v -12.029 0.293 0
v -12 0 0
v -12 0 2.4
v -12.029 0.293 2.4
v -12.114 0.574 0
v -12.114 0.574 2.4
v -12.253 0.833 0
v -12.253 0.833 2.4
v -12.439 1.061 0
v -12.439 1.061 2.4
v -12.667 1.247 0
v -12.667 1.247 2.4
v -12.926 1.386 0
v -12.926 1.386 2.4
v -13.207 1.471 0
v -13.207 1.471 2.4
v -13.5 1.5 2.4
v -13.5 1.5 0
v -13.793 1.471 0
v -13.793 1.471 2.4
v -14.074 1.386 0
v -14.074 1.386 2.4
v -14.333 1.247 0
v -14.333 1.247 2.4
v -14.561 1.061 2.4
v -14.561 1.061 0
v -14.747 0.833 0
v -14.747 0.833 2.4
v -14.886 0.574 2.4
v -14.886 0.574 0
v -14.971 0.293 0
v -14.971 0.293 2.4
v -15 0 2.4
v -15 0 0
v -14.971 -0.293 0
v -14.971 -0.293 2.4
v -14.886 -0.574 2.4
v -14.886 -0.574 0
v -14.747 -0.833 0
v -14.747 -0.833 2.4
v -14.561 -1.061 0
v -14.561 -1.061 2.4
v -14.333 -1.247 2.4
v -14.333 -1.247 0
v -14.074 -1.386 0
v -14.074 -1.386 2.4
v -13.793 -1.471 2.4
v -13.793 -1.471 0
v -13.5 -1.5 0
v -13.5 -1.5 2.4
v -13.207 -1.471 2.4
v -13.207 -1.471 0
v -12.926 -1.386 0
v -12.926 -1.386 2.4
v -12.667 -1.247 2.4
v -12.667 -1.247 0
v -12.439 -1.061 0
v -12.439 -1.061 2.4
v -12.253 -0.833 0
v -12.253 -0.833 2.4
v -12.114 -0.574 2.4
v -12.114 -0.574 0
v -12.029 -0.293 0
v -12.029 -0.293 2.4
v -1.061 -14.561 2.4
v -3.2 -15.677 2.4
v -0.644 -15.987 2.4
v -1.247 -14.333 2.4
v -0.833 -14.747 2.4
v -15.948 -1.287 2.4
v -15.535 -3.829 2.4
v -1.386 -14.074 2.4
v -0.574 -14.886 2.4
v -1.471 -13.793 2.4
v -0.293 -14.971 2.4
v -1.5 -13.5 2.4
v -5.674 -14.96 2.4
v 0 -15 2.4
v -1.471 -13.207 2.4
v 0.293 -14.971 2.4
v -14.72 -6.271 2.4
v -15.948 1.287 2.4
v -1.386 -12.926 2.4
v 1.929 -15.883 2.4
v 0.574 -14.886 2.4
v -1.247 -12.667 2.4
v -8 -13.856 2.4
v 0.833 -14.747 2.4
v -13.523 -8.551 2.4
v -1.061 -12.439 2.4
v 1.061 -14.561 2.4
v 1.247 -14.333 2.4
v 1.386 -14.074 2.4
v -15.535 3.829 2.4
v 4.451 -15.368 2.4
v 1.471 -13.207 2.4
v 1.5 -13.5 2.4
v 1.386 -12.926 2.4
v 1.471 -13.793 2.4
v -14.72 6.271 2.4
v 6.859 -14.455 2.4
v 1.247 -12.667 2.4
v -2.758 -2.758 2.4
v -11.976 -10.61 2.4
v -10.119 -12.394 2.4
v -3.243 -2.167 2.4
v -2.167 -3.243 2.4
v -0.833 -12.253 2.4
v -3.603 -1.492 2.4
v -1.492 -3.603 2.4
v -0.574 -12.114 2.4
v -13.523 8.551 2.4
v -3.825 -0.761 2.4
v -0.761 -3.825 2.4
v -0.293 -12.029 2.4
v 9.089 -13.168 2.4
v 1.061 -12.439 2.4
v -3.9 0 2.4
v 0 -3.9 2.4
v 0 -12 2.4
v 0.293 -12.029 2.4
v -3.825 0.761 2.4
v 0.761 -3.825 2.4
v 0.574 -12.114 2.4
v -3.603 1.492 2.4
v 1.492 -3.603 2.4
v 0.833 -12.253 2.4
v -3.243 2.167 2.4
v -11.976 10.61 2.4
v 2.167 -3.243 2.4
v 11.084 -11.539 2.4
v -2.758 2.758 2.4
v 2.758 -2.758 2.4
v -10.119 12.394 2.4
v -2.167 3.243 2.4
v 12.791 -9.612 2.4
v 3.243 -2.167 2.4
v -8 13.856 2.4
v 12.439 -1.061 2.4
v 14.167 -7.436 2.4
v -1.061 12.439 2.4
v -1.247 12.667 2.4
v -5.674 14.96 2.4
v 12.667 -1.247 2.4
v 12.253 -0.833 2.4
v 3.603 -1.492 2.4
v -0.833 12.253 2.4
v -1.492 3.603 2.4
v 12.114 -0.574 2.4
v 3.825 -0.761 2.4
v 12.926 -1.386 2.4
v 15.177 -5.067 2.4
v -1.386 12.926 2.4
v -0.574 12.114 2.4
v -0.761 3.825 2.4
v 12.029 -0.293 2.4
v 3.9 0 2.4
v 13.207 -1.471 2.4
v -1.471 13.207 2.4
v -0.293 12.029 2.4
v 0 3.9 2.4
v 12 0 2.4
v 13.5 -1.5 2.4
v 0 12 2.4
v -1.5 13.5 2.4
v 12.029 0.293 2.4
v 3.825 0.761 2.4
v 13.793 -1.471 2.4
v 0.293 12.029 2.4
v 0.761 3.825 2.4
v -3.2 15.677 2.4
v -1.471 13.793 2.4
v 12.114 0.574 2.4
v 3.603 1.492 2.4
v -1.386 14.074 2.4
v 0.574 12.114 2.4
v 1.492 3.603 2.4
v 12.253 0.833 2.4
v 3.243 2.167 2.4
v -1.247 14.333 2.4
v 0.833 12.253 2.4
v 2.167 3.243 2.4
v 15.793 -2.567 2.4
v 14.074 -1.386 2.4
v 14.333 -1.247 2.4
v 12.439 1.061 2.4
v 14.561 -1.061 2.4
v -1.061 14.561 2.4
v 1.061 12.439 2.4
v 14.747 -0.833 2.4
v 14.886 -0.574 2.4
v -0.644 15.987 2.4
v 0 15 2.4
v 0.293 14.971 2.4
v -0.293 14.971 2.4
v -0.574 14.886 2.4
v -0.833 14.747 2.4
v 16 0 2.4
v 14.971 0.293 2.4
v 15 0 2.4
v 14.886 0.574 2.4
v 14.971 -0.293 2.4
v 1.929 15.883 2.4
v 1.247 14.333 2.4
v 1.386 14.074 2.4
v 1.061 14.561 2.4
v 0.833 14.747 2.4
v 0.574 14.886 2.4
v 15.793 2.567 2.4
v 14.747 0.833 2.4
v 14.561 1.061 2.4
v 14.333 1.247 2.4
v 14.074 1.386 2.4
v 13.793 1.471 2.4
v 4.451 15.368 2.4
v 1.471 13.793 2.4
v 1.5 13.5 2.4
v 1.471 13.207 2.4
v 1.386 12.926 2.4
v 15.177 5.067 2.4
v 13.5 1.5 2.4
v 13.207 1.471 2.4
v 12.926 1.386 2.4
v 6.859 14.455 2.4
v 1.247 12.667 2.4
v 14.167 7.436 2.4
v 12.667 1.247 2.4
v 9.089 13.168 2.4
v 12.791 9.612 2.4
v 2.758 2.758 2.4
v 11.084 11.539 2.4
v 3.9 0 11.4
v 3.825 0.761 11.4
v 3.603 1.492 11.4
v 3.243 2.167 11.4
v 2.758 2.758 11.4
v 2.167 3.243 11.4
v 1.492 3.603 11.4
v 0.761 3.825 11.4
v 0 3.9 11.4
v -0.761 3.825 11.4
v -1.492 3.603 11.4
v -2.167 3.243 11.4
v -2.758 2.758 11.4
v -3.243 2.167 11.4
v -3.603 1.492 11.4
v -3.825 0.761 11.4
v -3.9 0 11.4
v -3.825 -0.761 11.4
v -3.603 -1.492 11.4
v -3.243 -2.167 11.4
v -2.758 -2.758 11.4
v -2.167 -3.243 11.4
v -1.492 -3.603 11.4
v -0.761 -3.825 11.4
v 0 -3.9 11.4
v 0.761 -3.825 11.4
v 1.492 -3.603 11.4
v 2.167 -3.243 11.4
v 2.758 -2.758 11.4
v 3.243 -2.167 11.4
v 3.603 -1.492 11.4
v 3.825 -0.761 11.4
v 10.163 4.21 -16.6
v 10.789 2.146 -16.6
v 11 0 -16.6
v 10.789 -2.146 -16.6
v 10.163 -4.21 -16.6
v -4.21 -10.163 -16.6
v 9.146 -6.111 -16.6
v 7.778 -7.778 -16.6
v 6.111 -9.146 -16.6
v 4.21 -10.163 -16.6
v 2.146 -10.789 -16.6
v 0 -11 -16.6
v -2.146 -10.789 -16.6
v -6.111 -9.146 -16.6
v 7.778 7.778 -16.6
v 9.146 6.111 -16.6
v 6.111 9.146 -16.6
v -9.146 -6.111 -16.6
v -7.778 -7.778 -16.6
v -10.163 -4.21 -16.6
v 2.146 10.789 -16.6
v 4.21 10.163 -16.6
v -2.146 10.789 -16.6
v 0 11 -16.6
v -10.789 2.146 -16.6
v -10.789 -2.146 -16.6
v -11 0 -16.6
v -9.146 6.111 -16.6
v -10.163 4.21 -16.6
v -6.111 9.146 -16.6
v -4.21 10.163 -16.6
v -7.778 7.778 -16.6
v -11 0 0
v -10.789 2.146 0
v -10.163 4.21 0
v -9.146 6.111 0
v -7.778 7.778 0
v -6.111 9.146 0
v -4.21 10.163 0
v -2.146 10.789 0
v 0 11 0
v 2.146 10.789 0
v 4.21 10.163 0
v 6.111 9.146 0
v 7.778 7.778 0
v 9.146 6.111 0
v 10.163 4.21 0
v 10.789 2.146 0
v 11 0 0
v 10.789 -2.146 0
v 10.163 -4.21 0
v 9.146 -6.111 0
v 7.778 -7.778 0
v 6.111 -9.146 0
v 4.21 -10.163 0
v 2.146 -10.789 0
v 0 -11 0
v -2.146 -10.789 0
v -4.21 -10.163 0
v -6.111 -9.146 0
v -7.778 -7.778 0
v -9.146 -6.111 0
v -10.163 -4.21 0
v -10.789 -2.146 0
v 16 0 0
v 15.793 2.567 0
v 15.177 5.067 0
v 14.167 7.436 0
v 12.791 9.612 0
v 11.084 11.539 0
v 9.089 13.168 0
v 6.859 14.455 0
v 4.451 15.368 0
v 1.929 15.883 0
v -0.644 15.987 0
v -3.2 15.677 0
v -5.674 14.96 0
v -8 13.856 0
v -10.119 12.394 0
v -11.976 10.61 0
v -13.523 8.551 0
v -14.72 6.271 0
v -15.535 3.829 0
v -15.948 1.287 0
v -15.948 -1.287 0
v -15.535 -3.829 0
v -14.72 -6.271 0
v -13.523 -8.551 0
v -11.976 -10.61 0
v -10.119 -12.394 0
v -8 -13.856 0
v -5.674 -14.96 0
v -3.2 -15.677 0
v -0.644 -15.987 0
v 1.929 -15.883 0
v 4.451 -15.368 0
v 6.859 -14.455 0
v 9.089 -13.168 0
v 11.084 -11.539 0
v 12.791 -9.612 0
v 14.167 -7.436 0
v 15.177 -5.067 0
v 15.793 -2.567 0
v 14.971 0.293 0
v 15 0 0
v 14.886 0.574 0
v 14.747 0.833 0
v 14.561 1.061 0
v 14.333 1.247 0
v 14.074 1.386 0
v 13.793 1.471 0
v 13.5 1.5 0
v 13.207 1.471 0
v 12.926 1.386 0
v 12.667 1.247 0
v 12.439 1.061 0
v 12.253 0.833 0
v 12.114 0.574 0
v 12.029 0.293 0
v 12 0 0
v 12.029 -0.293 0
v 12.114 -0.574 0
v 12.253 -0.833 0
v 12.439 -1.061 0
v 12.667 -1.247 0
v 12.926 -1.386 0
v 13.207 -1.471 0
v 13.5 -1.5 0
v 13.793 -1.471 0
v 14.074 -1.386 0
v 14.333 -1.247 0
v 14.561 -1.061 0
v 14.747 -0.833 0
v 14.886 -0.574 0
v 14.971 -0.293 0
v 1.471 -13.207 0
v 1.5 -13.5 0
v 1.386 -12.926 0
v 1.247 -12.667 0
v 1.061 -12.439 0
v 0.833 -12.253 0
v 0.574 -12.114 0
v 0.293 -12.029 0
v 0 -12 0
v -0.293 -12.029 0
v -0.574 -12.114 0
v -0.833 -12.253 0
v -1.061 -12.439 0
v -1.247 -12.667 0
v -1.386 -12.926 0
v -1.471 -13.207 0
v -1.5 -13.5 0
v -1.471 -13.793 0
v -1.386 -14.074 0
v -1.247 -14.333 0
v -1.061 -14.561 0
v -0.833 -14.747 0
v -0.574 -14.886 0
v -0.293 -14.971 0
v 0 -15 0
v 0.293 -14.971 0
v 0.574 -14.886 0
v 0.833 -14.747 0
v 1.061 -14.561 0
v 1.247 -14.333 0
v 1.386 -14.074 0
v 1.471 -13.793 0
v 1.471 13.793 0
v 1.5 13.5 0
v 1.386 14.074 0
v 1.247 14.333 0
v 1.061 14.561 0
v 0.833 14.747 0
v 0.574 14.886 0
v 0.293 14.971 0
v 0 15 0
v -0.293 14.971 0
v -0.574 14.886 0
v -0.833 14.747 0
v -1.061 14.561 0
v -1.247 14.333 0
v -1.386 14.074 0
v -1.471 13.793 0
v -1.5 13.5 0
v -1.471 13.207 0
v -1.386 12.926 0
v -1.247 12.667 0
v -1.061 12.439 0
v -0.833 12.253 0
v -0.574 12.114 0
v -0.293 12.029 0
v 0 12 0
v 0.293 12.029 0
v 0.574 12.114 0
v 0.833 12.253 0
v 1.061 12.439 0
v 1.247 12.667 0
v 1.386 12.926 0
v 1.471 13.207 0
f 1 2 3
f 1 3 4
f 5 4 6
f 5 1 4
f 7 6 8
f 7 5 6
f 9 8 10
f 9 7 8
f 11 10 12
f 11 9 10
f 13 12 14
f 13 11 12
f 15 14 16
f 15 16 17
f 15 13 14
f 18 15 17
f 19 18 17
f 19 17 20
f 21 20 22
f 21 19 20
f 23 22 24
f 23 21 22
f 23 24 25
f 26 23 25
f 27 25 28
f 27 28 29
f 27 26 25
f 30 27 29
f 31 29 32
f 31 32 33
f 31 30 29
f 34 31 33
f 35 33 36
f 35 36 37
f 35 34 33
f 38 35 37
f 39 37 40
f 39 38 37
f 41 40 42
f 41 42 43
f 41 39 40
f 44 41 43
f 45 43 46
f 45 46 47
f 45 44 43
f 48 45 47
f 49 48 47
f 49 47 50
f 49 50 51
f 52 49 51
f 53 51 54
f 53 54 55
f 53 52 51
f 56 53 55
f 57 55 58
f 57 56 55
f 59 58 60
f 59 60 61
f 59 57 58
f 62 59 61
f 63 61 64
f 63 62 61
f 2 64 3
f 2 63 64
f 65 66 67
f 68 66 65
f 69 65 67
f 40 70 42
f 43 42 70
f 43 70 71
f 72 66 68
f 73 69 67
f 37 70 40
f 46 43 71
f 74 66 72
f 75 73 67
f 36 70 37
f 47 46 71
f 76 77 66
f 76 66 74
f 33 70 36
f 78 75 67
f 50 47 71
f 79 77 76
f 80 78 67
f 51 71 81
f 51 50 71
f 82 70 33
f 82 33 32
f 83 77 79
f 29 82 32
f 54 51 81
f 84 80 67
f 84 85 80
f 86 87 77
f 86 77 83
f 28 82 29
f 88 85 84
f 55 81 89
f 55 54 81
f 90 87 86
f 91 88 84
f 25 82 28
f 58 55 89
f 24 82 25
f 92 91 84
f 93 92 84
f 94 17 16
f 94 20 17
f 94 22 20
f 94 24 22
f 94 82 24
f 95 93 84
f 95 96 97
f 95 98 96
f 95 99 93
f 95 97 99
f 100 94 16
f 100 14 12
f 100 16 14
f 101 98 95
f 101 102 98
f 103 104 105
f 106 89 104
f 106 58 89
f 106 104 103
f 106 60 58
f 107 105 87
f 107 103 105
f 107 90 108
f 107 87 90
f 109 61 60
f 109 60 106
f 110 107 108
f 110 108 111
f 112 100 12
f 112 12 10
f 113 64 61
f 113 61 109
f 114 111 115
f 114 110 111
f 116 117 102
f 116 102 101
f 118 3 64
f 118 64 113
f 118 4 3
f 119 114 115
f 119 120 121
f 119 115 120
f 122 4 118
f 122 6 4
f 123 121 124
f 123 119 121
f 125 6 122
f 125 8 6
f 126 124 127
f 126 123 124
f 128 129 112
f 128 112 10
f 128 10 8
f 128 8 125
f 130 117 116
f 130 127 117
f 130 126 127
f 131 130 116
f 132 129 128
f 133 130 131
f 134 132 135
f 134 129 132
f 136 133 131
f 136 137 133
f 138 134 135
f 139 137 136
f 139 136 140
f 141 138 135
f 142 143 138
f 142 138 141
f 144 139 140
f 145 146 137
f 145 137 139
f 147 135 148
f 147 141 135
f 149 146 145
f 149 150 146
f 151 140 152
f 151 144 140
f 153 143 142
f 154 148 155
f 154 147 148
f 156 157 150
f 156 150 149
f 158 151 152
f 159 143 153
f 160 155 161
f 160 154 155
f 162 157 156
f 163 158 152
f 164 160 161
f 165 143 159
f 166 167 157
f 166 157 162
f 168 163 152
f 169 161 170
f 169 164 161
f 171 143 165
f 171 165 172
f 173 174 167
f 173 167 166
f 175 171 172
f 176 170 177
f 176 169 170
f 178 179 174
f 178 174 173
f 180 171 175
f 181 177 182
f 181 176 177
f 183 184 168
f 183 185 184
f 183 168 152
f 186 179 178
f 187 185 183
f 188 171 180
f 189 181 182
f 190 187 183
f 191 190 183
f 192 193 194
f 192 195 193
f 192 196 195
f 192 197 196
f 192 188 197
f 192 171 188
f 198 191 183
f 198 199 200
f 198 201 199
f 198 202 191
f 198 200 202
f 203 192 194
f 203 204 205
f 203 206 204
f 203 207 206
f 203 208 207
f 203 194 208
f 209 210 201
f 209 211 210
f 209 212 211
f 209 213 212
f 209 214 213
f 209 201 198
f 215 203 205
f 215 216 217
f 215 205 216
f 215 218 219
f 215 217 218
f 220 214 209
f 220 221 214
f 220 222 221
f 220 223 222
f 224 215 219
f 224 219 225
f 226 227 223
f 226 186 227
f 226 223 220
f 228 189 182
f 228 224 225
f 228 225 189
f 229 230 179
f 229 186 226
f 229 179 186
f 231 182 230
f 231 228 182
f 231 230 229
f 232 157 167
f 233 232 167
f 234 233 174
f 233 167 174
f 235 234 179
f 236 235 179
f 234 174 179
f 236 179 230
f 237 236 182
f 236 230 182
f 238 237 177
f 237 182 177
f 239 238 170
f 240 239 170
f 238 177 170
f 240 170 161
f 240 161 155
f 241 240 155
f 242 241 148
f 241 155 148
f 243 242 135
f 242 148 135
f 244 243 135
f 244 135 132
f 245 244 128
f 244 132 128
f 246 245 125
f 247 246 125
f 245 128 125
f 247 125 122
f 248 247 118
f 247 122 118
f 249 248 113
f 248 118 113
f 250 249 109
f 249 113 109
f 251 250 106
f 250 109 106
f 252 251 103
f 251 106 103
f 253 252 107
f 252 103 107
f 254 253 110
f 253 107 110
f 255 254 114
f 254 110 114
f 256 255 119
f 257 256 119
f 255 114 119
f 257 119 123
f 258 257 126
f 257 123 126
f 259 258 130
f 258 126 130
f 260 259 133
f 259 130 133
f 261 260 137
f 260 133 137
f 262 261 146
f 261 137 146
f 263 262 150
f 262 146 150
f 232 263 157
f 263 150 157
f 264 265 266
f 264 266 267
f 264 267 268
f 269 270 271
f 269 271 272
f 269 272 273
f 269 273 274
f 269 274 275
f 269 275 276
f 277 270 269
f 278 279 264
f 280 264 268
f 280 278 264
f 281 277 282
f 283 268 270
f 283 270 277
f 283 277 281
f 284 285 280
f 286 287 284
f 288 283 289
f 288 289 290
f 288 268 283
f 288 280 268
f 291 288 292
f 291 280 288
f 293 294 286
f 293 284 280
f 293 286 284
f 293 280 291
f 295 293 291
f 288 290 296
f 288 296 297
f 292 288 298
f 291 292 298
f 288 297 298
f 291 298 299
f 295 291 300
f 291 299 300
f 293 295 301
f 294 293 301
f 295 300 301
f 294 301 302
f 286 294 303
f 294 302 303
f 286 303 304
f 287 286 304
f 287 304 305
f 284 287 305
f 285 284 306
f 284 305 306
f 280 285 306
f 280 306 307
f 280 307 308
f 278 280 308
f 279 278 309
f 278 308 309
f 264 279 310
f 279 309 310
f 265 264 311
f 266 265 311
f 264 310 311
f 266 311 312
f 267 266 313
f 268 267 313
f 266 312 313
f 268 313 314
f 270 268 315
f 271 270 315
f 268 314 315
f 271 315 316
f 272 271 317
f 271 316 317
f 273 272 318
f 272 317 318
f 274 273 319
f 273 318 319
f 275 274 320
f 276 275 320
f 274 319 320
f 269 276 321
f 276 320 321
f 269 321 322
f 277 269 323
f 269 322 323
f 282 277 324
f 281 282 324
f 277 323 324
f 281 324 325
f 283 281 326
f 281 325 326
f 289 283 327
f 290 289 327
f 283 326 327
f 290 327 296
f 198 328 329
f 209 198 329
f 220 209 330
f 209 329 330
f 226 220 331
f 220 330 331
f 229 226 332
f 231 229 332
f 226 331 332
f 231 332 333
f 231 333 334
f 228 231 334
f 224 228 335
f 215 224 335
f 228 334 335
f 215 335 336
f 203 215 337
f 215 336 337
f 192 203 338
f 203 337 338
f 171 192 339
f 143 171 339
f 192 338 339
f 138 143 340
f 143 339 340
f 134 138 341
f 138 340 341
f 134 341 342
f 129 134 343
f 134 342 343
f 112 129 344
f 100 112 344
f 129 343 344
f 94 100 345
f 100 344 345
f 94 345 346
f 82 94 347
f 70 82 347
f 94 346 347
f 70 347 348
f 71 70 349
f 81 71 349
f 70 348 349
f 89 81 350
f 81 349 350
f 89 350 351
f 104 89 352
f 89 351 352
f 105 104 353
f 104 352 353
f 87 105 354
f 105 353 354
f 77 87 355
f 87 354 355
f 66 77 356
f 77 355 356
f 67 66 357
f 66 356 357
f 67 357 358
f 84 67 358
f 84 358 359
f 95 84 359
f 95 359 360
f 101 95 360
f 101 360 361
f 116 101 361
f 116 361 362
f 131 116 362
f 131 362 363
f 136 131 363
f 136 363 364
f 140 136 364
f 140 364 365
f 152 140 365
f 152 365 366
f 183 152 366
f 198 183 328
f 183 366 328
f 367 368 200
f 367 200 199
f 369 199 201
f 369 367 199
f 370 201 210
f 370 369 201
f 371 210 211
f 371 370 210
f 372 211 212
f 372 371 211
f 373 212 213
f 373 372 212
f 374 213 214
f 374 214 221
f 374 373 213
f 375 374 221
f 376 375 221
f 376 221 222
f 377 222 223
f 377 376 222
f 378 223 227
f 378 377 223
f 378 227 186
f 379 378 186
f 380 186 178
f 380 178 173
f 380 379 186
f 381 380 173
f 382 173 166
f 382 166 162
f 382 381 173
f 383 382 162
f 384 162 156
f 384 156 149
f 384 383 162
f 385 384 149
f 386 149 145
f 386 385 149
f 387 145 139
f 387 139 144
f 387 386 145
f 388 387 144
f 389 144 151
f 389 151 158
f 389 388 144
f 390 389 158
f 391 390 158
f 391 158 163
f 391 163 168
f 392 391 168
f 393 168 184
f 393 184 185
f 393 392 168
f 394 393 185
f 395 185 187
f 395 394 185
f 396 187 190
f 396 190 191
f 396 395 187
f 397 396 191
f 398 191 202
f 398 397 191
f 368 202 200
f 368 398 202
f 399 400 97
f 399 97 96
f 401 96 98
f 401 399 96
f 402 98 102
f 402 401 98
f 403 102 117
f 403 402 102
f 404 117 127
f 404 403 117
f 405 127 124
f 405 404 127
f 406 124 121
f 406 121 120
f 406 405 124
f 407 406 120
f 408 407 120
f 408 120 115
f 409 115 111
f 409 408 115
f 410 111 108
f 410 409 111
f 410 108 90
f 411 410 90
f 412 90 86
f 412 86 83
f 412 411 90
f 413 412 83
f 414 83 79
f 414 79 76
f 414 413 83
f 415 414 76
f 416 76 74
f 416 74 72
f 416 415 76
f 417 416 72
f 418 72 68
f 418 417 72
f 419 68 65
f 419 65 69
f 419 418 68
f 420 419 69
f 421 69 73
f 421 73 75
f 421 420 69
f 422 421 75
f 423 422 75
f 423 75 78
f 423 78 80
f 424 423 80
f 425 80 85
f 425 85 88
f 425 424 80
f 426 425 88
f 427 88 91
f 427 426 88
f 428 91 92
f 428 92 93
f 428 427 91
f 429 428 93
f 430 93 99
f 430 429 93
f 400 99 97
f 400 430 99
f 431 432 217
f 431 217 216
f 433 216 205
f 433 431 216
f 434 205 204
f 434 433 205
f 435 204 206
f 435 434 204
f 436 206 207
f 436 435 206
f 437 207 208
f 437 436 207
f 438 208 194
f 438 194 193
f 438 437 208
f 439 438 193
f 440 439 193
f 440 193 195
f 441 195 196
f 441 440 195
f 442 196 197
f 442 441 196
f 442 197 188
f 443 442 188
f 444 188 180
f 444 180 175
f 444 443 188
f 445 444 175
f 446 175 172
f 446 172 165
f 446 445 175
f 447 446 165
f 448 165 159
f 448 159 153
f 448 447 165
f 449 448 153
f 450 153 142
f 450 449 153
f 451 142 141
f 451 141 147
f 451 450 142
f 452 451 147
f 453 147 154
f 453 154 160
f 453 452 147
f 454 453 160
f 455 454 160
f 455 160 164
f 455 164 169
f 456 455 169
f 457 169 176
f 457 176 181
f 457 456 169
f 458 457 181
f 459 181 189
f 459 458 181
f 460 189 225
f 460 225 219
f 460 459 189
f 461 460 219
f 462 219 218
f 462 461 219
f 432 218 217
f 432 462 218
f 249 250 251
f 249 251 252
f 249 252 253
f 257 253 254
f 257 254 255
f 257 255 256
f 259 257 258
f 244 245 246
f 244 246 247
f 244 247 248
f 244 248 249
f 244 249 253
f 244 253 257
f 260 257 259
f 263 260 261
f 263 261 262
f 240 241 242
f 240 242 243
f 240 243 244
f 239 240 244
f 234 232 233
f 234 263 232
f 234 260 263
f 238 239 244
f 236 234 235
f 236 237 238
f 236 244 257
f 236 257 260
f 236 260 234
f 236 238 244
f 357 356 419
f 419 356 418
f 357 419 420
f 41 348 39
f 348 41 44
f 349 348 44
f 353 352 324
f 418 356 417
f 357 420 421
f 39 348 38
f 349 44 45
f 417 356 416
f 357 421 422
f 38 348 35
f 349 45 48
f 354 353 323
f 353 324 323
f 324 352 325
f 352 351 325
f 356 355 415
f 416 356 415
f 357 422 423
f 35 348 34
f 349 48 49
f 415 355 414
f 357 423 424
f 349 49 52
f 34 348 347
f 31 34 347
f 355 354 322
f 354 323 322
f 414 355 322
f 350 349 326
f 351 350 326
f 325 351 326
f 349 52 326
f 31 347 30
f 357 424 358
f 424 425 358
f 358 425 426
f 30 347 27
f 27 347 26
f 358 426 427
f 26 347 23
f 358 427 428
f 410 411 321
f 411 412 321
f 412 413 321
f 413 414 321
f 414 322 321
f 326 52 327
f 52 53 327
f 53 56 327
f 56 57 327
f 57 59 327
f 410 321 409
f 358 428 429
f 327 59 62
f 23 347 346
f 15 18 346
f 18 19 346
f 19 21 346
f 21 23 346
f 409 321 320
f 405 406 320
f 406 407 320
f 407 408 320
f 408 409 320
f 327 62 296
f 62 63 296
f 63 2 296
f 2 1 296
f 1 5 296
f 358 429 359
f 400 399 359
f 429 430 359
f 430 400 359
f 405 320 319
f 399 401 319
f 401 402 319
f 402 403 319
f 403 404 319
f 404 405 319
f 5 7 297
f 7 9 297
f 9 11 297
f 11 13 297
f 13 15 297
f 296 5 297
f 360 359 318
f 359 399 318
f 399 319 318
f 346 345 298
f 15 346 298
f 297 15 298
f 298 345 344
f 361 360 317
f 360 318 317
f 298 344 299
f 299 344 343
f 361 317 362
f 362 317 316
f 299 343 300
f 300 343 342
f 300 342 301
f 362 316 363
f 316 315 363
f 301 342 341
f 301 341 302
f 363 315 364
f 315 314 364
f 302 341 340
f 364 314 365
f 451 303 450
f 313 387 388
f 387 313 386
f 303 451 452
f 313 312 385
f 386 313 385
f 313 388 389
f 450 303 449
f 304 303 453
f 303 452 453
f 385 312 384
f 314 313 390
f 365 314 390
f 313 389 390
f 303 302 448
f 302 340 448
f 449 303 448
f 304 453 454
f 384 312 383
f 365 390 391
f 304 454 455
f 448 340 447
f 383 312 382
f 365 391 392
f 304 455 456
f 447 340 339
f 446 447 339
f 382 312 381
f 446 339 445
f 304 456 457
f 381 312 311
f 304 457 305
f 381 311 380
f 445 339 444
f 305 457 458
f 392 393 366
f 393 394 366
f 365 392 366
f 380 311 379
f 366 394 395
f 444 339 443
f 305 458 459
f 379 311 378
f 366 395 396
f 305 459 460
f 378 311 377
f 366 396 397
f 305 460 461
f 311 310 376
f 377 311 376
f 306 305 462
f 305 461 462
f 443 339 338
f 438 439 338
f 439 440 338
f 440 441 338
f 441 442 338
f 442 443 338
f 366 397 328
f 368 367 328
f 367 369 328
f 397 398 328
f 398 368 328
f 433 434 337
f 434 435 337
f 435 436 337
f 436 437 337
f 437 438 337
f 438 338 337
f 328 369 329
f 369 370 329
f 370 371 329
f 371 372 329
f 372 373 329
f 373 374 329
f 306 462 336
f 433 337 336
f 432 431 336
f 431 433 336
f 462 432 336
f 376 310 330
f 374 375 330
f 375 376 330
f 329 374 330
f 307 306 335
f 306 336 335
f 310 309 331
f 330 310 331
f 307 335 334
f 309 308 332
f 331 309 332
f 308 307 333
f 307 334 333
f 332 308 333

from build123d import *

# Parameters (mm, degrees)
SKETCH_1_R      = 16
SKETCH_1_R_2    = 1.5
EXTRUDE_1_DEPTH = 2.4
SKETCH_2_R      = 3.9
EXTRUDE_2_DEPTH = 9
SKETCH_3_R      = 11
EXTRUDE_3_DEPTH = 16.6


with BuildPart() as part:
    # Эскиз1 → Бобышка-Вытянуть1 (new body)
    with BuildSketch(Plane.XY):
        Circle(SKETCH_1_R)
        with Locations((-13.5, 0)):
            Circle(SKETCH_1_R_2, mode=Mode.SUBTRACT)
        with Locations((0, 13.5)):
            Circle(SKETCH_1_R_2, mode=Mode.SUBTRACT)
        with Locations((13.5, 0)):
            Circle(SKETCH_1_R_2, mode=Mode.SUBTRACT)
        with Locations((0, -13.5)):
            Circle(SKETCH_1_R_2, mode=Mode.SUBTRACT)
    extrude(amount=EXTRUDE_1_DEPTH)

    # Эскиз2 → Бобышка-Вытянуть2 (add)
    with BuildSketch(Plane.XY.offset(2.4)):
        Circle(SKETCH_2_R)
    extrude(amount=EXTRUDE_2_DEPTH)

    # Эскиз3 → Бобышка-Вытянуть3 (add)
    with BuildSketch(Plane(origin=(0, 0, 0), x_dir=(-1, 0, 0), z_dir=(0, 0, -1))):
        Circle(SKETCH_3_R)
    extrude(amount=EXTRUDE_3_DEPTH)


solid = part.part
